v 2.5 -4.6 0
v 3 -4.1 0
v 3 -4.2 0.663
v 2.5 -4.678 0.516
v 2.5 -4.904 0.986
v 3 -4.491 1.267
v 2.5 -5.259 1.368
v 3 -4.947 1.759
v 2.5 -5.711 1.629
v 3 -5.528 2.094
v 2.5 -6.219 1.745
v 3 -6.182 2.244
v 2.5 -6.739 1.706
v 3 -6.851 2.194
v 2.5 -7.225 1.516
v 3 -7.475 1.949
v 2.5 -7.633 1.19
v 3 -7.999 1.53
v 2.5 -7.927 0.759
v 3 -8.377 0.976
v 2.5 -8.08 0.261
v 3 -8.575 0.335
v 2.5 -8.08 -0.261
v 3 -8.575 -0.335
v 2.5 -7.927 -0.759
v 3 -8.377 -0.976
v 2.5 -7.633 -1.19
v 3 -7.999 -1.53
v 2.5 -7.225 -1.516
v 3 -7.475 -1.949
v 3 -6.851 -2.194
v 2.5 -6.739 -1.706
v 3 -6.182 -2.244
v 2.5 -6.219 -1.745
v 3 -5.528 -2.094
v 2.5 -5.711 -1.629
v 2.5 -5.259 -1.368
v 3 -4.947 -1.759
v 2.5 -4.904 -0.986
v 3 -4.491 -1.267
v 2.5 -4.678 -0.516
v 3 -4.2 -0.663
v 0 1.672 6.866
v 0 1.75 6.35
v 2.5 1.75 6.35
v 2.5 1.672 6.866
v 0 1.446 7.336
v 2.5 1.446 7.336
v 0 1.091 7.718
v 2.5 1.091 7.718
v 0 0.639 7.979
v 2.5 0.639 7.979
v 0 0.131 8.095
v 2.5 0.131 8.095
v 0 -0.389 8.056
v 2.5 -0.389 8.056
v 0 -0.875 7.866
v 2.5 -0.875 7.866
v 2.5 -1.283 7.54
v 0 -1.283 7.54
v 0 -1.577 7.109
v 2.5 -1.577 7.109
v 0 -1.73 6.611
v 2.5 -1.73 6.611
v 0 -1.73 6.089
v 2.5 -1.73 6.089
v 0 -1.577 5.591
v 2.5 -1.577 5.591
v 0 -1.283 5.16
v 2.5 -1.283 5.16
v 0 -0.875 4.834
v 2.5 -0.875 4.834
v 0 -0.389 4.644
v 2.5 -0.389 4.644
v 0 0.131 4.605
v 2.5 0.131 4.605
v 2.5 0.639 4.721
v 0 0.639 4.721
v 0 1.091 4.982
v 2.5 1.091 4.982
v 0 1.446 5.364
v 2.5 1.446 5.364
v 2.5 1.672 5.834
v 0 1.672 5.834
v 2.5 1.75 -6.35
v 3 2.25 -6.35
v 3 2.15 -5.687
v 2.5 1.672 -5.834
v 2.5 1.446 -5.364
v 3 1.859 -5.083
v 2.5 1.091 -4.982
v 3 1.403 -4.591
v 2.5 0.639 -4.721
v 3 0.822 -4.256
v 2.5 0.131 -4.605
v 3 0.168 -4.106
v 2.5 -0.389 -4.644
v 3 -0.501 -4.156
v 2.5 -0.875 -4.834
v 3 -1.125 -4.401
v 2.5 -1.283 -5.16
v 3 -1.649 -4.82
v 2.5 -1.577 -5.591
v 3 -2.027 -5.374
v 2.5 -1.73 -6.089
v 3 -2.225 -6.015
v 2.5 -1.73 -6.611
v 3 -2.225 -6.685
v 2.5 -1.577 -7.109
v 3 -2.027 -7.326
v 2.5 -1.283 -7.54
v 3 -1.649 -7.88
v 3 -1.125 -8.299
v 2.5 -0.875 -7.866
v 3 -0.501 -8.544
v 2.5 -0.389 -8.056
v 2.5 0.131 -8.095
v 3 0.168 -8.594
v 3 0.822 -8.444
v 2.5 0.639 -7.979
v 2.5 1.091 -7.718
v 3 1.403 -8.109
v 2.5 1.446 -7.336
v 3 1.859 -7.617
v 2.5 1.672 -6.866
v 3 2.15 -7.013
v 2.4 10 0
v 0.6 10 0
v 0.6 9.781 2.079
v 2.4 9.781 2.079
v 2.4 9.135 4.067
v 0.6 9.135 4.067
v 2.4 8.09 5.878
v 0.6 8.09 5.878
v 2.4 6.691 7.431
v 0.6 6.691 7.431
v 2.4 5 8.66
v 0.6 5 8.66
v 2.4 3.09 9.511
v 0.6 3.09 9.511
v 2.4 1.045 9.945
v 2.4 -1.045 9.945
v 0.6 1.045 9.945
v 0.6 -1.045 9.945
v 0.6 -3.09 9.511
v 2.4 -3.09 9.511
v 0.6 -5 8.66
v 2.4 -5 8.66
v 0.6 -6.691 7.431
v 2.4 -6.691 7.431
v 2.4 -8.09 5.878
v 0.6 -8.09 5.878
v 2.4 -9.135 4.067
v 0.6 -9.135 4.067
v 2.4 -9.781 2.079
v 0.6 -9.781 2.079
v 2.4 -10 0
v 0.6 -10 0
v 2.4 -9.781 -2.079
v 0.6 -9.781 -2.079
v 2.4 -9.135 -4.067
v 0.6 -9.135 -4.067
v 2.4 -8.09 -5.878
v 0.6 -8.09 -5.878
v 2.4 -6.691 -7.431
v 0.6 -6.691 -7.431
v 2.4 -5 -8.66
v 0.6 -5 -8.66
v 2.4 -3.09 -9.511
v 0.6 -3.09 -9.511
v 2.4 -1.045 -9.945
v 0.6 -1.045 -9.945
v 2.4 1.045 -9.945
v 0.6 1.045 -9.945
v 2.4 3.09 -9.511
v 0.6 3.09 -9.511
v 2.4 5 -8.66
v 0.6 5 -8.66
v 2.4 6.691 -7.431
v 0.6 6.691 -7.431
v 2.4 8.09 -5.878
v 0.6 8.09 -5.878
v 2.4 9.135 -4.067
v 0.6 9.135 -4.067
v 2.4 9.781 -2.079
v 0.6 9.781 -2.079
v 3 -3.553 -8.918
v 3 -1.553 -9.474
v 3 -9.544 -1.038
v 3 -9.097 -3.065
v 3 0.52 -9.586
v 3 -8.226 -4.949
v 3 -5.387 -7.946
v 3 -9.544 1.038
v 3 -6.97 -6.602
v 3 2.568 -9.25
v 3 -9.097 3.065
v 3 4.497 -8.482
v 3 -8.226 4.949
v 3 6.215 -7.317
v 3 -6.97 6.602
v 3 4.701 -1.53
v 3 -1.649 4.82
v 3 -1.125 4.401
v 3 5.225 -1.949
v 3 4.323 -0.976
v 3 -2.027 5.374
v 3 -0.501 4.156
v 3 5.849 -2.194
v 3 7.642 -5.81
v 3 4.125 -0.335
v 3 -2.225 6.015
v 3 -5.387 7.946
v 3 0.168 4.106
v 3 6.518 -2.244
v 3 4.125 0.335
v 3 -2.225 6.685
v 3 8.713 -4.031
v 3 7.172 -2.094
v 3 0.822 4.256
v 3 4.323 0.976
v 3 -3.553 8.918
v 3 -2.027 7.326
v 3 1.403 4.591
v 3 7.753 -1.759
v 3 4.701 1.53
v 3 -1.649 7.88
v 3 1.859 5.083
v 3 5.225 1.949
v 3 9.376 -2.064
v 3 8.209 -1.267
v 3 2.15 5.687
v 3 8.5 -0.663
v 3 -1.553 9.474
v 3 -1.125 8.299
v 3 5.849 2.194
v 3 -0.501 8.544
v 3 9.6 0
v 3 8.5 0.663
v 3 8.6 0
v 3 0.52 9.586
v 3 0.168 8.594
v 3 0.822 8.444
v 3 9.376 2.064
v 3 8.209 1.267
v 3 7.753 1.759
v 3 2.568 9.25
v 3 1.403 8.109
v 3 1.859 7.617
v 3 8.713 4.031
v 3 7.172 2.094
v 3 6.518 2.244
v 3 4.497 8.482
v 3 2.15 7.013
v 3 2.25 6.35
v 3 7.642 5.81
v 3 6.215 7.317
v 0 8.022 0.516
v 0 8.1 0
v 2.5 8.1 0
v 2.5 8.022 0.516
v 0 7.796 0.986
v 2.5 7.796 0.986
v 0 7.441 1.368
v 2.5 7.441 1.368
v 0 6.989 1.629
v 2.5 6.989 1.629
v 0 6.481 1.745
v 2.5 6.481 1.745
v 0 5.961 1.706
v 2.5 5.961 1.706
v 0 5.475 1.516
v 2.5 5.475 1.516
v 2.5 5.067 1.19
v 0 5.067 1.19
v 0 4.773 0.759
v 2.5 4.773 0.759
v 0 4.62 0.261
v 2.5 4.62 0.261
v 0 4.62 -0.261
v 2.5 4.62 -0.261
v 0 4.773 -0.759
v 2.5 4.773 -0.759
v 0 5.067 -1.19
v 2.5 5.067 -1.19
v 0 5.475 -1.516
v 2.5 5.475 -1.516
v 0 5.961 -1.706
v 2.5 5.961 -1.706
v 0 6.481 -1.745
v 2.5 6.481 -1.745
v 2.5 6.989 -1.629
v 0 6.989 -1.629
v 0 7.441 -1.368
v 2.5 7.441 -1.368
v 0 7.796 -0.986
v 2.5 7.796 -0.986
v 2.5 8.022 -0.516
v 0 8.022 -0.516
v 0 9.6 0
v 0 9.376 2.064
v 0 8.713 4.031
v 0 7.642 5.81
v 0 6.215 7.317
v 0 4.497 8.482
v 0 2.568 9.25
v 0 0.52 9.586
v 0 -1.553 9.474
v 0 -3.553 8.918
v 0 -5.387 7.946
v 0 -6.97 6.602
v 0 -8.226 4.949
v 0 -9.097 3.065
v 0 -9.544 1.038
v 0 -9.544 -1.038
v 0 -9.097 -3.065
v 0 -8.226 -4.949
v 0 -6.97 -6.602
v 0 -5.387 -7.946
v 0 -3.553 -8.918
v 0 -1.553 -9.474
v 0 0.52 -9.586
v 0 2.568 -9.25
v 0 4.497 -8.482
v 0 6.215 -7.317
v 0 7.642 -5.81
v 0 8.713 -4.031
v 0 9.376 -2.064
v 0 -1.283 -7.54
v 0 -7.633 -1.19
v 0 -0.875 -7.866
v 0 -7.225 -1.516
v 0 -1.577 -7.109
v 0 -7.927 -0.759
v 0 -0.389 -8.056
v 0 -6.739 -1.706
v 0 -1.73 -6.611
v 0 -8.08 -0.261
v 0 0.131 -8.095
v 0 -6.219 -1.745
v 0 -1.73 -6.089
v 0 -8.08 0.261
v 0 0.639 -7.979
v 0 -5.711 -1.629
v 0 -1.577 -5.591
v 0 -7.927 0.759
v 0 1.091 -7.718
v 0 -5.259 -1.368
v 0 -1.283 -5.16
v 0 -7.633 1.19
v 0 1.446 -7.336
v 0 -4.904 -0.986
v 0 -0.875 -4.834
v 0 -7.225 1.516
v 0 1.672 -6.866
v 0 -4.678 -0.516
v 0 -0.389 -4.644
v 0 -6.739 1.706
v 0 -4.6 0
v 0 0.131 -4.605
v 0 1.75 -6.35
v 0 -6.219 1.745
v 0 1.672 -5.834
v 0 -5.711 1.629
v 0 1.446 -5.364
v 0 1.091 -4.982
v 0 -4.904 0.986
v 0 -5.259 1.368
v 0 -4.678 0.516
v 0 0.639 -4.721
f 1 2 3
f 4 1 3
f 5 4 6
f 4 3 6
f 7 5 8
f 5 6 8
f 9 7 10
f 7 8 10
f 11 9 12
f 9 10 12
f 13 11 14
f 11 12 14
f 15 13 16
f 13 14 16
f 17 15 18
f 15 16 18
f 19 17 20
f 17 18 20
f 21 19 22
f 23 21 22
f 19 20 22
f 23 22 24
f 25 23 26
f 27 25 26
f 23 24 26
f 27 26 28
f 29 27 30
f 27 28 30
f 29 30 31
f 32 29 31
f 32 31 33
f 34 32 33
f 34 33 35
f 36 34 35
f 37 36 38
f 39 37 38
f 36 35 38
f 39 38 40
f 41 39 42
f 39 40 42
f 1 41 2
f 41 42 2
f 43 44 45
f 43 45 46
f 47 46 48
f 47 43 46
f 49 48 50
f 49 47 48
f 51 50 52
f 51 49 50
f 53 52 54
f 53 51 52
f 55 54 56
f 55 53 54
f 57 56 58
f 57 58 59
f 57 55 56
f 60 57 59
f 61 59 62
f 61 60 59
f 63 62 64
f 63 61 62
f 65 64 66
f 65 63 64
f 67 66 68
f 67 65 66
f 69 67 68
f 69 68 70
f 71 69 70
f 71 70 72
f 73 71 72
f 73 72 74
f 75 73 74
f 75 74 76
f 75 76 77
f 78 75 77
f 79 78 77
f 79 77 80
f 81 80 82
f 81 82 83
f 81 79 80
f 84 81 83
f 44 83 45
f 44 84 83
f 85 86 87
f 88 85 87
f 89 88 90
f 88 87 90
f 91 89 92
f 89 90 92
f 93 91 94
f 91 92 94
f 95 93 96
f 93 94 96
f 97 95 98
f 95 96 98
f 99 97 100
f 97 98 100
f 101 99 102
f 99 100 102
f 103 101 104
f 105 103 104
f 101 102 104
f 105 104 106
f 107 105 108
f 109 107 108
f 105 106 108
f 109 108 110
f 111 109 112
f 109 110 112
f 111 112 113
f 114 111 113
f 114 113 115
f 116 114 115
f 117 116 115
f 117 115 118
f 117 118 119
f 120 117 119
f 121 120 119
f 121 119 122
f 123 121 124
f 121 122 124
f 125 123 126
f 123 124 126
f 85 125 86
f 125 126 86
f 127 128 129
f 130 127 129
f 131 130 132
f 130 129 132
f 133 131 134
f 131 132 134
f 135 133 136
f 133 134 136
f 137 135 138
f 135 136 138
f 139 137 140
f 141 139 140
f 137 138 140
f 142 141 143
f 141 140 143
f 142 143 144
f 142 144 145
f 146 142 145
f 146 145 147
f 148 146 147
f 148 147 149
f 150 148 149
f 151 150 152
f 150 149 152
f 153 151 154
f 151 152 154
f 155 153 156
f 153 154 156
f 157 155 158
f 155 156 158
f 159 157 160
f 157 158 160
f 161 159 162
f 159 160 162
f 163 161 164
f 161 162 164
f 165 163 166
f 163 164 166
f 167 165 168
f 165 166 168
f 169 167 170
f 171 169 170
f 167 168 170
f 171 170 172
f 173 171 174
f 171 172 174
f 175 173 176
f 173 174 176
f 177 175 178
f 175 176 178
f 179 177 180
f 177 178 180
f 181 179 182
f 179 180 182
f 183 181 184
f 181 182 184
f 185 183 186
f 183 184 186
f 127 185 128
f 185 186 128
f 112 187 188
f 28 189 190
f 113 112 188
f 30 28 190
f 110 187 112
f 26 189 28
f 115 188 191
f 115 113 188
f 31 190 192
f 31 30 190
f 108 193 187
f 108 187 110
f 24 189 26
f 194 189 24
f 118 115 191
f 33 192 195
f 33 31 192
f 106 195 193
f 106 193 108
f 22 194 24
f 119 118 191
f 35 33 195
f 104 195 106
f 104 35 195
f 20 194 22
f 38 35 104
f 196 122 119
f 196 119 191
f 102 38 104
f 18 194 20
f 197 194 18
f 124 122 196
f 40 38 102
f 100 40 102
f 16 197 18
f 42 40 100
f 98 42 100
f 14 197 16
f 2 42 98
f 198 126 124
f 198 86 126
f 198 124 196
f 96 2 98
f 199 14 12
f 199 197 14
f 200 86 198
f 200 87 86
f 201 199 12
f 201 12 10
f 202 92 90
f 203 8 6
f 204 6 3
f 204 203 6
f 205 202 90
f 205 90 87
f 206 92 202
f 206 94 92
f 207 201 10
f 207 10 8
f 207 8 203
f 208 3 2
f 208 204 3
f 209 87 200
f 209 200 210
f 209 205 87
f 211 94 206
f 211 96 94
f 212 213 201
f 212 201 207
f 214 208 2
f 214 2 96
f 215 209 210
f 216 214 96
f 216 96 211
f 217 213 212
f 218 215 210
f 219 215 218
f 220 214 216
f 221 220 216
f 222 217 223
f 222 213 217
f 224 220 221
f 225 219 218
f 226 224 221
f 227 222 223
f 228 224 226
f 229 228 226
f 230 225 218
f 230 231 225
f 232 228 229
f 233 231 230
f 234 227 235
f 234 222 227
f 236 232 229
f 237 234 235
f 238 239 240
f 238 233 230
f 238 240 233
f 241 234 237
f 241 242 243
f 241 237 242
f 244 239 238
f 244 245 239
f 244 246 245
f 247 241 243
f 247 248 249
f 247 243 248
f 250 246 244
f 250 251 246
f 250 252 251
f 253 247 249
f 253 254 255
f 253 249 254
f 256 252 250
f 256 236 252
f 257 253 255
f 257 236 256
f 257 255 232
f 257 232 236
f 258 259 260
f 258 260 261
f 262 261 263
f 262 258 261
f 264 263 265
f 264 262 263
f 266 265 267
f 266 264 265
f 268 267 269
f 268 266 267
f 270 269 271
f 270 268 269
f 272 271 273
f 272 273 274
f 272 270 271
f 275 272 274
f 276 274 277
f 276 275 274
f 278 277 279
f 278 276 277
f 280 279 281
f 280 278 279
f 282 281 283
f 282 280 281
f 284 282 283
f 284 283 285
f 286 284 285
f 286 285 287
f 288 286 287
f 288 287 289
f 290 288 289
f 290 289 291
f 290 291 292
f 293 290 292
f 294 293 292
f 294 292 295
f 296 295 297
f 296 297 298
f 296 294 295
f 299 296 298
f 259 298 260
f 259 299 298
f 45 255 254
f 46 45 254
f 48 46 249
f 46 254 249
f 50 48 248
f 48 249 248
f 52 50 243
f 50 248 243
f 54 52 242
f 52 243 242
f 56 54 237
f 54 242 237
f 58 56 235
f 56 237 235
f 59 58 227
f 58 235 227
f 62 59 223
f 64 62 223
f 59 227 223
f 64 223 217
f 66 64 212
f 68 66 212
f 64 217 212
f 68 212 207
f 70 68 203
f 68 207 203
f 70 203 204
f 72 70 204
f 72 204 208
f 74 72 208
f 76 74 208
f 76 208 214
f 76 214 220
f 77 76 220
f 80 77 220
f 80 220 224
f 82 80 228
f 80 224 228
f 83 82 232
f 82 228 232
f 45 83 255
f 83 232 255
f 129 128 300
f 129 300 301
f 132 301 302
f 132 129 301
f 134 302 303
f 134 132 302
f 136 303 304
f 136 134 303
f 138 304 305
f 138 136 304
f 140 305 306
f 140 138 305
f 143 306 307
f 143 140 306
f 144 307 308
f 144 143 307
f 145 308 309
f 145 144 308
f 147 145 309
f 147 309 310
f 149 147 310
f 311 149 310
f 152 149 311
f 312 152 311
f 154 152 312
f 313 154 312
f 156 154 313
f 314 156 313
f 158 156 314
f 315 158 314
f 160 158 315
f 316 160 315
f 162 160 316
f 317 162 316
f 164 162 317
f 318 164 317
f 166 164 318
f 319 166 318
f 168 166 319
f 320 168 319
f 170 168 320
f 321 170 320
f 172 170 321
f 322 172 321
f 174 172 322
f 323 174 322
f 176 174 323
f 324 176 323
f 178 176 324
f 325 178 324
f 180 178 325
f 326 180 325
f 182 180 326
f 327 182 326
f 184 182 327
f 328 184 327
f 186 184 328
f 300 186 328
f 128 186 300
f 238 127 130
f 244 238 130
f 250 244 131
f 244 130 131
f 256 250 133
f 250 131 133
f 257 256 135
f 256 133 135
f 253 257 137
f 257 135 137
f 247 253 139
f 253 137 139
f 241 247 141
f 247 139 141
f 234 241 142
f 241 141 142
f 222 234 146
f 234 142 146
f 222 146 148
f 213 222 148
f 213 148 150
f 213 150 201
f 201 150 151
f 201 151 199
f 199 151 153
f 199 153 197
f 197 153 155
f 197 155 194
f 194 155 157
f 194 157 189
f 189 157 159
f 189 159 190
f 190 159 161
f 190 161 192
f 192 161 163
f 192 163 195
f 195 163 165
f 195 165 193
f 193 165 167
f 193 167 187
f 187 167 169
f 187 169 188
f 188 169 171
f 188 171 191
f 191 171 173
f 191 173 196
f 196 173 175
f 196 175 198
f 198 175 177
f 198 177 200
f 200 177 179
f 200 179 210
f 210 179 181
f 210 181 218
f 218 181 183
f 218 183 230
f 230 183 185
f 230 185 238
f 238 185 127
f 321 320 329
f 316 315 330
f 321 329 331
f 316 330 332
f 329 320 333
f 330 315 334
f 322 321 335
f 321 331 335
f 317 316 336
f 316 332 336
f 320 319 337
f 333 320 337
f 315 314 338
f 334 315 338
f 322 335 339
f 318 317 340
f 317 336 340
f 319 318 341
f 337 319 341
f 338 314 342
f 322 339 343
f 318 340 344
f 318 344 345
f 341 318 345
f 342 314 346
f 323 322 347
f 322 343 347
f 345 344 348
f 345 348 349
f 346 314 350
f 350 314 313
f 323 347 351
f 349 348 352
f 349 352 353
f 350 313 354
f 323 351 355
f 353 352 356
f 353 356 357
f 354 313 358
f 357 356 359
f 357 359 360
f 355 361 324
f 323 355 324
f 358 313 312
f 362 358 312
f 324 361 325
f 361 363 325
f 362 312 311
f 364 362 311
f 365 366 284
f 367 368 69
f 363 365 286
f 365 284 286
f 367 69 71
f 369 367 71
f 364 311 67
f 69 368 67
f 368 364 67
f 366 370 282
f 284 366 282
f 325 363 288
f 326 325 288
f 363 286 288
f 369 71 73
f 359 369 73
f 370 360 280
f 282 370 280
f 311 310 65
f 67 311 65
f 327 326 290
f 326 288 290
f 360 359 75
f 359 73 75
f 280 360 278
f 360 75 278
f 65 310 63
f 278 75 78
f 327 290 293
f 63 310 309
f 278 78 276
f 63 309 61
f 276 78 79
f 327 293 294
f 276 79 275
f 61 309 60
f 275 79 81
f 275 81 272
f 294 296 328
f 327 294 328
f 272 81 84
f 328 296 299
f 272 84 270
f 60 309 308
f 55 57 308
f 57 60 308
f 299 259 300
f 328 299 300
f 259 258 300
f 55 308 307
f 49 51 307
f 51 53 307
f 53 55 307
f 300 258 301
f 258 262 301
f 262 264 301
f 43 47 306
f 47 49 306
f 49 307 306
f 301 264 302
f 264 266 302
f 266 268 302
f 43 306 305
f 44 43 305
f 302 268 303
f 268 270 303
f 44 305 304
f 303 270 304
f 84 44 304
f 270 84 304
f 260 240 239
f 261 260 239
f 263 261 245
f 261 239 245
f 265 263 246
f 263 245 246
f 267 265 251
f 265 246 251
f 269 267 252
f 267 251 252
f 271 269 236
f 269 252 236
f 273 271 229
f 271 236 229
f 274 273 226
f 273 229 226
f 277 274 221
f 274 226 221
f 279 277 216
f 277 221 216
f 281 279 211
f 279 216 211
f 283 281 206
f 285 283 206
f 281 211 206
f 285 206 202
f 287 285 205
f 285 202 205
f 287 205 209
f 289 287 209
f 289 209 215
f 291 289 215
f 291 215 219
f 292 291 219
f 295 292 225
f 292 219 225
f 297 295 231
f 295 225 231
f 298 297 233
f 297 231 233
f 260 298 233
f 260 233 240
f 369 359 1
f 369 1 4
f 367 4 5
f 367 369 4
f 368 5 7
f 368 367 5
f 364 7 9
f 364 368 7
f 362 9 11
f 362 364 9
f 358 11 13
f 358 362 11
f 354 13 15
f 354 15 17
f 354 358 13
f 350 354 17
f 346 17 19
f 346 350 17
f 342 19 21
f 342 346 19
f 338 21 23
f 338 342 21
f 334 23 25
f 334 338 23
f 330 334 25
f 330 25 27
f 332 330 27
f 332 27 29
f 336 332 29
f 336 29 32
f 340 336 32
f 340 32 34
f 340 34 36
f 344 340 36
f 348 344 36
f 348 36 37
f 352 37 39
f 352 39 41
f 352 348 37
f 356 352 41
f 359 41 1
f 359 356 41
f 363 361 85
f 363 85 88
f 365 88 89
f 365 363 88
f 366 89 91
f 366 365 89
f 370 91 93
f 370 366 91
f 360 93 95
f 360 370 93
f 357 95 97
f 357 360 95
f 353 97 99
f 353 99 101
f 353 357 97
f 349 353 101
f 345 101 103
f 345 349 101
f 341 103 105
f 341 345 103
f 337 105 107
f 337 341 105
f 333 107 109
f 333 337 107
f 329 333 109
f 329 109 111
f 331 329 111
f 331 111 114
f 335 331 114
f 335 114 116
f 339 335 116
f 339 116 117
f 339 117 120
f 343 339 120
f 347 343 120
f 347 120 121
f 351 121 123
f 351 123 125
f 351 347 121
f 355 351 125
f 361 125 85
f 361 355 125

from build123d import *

# Parameters (mm, degrees)
F0_R     = 10
F0_R_2   = 1.75
F1_DEPTH = 3
F2_SIZE  = 0.5
F3_SIZE2 = 0.6
F3_SIZE  = 0.4


with BuildPart() as f1:
    # F0 (on Right) → F1 (new body)
    with BuildSketch(Plane.YZ):
        Circle(F0_R)
        with Locations((0, -6.35)):
            Circle(F0_R_2, mode=Mode.SUBTRACT)
        with Locations((-6.35, 0)):
            Circle(F0_R_2, mode=Mode.SUBTRACT)
        with Locations((6.35, 0)):
            Circle(F0_R_2, mode=Mode.SUBTRACT)
        with Locations((0, 6.35)):
            Circle(F0_R_2, mode=Mode.SUBTRACT)
    extrude(amount=F1_DEPTH)

    # F2
    f2_edges = [f1.edges().sort_by_distance(p)[0] for p in [
        (3, -8.1, 0),
        (3, -1.75, 6.35),
        (3, 4.6, 0),
        (3, -1.75, -6.35),
    ]]
    chamfer(f2_edges, length=F2_SIZE)

    # F3
    f3_edges = [f1.edges().sort_by_distance(p)[0] for p in [
        (3, -10, 0),
        (0, -10, 0),
    ]]
    chamfer(f3_edges, length=F3_SIZE, length2=F3_SIZE2)


solid = f1.part
